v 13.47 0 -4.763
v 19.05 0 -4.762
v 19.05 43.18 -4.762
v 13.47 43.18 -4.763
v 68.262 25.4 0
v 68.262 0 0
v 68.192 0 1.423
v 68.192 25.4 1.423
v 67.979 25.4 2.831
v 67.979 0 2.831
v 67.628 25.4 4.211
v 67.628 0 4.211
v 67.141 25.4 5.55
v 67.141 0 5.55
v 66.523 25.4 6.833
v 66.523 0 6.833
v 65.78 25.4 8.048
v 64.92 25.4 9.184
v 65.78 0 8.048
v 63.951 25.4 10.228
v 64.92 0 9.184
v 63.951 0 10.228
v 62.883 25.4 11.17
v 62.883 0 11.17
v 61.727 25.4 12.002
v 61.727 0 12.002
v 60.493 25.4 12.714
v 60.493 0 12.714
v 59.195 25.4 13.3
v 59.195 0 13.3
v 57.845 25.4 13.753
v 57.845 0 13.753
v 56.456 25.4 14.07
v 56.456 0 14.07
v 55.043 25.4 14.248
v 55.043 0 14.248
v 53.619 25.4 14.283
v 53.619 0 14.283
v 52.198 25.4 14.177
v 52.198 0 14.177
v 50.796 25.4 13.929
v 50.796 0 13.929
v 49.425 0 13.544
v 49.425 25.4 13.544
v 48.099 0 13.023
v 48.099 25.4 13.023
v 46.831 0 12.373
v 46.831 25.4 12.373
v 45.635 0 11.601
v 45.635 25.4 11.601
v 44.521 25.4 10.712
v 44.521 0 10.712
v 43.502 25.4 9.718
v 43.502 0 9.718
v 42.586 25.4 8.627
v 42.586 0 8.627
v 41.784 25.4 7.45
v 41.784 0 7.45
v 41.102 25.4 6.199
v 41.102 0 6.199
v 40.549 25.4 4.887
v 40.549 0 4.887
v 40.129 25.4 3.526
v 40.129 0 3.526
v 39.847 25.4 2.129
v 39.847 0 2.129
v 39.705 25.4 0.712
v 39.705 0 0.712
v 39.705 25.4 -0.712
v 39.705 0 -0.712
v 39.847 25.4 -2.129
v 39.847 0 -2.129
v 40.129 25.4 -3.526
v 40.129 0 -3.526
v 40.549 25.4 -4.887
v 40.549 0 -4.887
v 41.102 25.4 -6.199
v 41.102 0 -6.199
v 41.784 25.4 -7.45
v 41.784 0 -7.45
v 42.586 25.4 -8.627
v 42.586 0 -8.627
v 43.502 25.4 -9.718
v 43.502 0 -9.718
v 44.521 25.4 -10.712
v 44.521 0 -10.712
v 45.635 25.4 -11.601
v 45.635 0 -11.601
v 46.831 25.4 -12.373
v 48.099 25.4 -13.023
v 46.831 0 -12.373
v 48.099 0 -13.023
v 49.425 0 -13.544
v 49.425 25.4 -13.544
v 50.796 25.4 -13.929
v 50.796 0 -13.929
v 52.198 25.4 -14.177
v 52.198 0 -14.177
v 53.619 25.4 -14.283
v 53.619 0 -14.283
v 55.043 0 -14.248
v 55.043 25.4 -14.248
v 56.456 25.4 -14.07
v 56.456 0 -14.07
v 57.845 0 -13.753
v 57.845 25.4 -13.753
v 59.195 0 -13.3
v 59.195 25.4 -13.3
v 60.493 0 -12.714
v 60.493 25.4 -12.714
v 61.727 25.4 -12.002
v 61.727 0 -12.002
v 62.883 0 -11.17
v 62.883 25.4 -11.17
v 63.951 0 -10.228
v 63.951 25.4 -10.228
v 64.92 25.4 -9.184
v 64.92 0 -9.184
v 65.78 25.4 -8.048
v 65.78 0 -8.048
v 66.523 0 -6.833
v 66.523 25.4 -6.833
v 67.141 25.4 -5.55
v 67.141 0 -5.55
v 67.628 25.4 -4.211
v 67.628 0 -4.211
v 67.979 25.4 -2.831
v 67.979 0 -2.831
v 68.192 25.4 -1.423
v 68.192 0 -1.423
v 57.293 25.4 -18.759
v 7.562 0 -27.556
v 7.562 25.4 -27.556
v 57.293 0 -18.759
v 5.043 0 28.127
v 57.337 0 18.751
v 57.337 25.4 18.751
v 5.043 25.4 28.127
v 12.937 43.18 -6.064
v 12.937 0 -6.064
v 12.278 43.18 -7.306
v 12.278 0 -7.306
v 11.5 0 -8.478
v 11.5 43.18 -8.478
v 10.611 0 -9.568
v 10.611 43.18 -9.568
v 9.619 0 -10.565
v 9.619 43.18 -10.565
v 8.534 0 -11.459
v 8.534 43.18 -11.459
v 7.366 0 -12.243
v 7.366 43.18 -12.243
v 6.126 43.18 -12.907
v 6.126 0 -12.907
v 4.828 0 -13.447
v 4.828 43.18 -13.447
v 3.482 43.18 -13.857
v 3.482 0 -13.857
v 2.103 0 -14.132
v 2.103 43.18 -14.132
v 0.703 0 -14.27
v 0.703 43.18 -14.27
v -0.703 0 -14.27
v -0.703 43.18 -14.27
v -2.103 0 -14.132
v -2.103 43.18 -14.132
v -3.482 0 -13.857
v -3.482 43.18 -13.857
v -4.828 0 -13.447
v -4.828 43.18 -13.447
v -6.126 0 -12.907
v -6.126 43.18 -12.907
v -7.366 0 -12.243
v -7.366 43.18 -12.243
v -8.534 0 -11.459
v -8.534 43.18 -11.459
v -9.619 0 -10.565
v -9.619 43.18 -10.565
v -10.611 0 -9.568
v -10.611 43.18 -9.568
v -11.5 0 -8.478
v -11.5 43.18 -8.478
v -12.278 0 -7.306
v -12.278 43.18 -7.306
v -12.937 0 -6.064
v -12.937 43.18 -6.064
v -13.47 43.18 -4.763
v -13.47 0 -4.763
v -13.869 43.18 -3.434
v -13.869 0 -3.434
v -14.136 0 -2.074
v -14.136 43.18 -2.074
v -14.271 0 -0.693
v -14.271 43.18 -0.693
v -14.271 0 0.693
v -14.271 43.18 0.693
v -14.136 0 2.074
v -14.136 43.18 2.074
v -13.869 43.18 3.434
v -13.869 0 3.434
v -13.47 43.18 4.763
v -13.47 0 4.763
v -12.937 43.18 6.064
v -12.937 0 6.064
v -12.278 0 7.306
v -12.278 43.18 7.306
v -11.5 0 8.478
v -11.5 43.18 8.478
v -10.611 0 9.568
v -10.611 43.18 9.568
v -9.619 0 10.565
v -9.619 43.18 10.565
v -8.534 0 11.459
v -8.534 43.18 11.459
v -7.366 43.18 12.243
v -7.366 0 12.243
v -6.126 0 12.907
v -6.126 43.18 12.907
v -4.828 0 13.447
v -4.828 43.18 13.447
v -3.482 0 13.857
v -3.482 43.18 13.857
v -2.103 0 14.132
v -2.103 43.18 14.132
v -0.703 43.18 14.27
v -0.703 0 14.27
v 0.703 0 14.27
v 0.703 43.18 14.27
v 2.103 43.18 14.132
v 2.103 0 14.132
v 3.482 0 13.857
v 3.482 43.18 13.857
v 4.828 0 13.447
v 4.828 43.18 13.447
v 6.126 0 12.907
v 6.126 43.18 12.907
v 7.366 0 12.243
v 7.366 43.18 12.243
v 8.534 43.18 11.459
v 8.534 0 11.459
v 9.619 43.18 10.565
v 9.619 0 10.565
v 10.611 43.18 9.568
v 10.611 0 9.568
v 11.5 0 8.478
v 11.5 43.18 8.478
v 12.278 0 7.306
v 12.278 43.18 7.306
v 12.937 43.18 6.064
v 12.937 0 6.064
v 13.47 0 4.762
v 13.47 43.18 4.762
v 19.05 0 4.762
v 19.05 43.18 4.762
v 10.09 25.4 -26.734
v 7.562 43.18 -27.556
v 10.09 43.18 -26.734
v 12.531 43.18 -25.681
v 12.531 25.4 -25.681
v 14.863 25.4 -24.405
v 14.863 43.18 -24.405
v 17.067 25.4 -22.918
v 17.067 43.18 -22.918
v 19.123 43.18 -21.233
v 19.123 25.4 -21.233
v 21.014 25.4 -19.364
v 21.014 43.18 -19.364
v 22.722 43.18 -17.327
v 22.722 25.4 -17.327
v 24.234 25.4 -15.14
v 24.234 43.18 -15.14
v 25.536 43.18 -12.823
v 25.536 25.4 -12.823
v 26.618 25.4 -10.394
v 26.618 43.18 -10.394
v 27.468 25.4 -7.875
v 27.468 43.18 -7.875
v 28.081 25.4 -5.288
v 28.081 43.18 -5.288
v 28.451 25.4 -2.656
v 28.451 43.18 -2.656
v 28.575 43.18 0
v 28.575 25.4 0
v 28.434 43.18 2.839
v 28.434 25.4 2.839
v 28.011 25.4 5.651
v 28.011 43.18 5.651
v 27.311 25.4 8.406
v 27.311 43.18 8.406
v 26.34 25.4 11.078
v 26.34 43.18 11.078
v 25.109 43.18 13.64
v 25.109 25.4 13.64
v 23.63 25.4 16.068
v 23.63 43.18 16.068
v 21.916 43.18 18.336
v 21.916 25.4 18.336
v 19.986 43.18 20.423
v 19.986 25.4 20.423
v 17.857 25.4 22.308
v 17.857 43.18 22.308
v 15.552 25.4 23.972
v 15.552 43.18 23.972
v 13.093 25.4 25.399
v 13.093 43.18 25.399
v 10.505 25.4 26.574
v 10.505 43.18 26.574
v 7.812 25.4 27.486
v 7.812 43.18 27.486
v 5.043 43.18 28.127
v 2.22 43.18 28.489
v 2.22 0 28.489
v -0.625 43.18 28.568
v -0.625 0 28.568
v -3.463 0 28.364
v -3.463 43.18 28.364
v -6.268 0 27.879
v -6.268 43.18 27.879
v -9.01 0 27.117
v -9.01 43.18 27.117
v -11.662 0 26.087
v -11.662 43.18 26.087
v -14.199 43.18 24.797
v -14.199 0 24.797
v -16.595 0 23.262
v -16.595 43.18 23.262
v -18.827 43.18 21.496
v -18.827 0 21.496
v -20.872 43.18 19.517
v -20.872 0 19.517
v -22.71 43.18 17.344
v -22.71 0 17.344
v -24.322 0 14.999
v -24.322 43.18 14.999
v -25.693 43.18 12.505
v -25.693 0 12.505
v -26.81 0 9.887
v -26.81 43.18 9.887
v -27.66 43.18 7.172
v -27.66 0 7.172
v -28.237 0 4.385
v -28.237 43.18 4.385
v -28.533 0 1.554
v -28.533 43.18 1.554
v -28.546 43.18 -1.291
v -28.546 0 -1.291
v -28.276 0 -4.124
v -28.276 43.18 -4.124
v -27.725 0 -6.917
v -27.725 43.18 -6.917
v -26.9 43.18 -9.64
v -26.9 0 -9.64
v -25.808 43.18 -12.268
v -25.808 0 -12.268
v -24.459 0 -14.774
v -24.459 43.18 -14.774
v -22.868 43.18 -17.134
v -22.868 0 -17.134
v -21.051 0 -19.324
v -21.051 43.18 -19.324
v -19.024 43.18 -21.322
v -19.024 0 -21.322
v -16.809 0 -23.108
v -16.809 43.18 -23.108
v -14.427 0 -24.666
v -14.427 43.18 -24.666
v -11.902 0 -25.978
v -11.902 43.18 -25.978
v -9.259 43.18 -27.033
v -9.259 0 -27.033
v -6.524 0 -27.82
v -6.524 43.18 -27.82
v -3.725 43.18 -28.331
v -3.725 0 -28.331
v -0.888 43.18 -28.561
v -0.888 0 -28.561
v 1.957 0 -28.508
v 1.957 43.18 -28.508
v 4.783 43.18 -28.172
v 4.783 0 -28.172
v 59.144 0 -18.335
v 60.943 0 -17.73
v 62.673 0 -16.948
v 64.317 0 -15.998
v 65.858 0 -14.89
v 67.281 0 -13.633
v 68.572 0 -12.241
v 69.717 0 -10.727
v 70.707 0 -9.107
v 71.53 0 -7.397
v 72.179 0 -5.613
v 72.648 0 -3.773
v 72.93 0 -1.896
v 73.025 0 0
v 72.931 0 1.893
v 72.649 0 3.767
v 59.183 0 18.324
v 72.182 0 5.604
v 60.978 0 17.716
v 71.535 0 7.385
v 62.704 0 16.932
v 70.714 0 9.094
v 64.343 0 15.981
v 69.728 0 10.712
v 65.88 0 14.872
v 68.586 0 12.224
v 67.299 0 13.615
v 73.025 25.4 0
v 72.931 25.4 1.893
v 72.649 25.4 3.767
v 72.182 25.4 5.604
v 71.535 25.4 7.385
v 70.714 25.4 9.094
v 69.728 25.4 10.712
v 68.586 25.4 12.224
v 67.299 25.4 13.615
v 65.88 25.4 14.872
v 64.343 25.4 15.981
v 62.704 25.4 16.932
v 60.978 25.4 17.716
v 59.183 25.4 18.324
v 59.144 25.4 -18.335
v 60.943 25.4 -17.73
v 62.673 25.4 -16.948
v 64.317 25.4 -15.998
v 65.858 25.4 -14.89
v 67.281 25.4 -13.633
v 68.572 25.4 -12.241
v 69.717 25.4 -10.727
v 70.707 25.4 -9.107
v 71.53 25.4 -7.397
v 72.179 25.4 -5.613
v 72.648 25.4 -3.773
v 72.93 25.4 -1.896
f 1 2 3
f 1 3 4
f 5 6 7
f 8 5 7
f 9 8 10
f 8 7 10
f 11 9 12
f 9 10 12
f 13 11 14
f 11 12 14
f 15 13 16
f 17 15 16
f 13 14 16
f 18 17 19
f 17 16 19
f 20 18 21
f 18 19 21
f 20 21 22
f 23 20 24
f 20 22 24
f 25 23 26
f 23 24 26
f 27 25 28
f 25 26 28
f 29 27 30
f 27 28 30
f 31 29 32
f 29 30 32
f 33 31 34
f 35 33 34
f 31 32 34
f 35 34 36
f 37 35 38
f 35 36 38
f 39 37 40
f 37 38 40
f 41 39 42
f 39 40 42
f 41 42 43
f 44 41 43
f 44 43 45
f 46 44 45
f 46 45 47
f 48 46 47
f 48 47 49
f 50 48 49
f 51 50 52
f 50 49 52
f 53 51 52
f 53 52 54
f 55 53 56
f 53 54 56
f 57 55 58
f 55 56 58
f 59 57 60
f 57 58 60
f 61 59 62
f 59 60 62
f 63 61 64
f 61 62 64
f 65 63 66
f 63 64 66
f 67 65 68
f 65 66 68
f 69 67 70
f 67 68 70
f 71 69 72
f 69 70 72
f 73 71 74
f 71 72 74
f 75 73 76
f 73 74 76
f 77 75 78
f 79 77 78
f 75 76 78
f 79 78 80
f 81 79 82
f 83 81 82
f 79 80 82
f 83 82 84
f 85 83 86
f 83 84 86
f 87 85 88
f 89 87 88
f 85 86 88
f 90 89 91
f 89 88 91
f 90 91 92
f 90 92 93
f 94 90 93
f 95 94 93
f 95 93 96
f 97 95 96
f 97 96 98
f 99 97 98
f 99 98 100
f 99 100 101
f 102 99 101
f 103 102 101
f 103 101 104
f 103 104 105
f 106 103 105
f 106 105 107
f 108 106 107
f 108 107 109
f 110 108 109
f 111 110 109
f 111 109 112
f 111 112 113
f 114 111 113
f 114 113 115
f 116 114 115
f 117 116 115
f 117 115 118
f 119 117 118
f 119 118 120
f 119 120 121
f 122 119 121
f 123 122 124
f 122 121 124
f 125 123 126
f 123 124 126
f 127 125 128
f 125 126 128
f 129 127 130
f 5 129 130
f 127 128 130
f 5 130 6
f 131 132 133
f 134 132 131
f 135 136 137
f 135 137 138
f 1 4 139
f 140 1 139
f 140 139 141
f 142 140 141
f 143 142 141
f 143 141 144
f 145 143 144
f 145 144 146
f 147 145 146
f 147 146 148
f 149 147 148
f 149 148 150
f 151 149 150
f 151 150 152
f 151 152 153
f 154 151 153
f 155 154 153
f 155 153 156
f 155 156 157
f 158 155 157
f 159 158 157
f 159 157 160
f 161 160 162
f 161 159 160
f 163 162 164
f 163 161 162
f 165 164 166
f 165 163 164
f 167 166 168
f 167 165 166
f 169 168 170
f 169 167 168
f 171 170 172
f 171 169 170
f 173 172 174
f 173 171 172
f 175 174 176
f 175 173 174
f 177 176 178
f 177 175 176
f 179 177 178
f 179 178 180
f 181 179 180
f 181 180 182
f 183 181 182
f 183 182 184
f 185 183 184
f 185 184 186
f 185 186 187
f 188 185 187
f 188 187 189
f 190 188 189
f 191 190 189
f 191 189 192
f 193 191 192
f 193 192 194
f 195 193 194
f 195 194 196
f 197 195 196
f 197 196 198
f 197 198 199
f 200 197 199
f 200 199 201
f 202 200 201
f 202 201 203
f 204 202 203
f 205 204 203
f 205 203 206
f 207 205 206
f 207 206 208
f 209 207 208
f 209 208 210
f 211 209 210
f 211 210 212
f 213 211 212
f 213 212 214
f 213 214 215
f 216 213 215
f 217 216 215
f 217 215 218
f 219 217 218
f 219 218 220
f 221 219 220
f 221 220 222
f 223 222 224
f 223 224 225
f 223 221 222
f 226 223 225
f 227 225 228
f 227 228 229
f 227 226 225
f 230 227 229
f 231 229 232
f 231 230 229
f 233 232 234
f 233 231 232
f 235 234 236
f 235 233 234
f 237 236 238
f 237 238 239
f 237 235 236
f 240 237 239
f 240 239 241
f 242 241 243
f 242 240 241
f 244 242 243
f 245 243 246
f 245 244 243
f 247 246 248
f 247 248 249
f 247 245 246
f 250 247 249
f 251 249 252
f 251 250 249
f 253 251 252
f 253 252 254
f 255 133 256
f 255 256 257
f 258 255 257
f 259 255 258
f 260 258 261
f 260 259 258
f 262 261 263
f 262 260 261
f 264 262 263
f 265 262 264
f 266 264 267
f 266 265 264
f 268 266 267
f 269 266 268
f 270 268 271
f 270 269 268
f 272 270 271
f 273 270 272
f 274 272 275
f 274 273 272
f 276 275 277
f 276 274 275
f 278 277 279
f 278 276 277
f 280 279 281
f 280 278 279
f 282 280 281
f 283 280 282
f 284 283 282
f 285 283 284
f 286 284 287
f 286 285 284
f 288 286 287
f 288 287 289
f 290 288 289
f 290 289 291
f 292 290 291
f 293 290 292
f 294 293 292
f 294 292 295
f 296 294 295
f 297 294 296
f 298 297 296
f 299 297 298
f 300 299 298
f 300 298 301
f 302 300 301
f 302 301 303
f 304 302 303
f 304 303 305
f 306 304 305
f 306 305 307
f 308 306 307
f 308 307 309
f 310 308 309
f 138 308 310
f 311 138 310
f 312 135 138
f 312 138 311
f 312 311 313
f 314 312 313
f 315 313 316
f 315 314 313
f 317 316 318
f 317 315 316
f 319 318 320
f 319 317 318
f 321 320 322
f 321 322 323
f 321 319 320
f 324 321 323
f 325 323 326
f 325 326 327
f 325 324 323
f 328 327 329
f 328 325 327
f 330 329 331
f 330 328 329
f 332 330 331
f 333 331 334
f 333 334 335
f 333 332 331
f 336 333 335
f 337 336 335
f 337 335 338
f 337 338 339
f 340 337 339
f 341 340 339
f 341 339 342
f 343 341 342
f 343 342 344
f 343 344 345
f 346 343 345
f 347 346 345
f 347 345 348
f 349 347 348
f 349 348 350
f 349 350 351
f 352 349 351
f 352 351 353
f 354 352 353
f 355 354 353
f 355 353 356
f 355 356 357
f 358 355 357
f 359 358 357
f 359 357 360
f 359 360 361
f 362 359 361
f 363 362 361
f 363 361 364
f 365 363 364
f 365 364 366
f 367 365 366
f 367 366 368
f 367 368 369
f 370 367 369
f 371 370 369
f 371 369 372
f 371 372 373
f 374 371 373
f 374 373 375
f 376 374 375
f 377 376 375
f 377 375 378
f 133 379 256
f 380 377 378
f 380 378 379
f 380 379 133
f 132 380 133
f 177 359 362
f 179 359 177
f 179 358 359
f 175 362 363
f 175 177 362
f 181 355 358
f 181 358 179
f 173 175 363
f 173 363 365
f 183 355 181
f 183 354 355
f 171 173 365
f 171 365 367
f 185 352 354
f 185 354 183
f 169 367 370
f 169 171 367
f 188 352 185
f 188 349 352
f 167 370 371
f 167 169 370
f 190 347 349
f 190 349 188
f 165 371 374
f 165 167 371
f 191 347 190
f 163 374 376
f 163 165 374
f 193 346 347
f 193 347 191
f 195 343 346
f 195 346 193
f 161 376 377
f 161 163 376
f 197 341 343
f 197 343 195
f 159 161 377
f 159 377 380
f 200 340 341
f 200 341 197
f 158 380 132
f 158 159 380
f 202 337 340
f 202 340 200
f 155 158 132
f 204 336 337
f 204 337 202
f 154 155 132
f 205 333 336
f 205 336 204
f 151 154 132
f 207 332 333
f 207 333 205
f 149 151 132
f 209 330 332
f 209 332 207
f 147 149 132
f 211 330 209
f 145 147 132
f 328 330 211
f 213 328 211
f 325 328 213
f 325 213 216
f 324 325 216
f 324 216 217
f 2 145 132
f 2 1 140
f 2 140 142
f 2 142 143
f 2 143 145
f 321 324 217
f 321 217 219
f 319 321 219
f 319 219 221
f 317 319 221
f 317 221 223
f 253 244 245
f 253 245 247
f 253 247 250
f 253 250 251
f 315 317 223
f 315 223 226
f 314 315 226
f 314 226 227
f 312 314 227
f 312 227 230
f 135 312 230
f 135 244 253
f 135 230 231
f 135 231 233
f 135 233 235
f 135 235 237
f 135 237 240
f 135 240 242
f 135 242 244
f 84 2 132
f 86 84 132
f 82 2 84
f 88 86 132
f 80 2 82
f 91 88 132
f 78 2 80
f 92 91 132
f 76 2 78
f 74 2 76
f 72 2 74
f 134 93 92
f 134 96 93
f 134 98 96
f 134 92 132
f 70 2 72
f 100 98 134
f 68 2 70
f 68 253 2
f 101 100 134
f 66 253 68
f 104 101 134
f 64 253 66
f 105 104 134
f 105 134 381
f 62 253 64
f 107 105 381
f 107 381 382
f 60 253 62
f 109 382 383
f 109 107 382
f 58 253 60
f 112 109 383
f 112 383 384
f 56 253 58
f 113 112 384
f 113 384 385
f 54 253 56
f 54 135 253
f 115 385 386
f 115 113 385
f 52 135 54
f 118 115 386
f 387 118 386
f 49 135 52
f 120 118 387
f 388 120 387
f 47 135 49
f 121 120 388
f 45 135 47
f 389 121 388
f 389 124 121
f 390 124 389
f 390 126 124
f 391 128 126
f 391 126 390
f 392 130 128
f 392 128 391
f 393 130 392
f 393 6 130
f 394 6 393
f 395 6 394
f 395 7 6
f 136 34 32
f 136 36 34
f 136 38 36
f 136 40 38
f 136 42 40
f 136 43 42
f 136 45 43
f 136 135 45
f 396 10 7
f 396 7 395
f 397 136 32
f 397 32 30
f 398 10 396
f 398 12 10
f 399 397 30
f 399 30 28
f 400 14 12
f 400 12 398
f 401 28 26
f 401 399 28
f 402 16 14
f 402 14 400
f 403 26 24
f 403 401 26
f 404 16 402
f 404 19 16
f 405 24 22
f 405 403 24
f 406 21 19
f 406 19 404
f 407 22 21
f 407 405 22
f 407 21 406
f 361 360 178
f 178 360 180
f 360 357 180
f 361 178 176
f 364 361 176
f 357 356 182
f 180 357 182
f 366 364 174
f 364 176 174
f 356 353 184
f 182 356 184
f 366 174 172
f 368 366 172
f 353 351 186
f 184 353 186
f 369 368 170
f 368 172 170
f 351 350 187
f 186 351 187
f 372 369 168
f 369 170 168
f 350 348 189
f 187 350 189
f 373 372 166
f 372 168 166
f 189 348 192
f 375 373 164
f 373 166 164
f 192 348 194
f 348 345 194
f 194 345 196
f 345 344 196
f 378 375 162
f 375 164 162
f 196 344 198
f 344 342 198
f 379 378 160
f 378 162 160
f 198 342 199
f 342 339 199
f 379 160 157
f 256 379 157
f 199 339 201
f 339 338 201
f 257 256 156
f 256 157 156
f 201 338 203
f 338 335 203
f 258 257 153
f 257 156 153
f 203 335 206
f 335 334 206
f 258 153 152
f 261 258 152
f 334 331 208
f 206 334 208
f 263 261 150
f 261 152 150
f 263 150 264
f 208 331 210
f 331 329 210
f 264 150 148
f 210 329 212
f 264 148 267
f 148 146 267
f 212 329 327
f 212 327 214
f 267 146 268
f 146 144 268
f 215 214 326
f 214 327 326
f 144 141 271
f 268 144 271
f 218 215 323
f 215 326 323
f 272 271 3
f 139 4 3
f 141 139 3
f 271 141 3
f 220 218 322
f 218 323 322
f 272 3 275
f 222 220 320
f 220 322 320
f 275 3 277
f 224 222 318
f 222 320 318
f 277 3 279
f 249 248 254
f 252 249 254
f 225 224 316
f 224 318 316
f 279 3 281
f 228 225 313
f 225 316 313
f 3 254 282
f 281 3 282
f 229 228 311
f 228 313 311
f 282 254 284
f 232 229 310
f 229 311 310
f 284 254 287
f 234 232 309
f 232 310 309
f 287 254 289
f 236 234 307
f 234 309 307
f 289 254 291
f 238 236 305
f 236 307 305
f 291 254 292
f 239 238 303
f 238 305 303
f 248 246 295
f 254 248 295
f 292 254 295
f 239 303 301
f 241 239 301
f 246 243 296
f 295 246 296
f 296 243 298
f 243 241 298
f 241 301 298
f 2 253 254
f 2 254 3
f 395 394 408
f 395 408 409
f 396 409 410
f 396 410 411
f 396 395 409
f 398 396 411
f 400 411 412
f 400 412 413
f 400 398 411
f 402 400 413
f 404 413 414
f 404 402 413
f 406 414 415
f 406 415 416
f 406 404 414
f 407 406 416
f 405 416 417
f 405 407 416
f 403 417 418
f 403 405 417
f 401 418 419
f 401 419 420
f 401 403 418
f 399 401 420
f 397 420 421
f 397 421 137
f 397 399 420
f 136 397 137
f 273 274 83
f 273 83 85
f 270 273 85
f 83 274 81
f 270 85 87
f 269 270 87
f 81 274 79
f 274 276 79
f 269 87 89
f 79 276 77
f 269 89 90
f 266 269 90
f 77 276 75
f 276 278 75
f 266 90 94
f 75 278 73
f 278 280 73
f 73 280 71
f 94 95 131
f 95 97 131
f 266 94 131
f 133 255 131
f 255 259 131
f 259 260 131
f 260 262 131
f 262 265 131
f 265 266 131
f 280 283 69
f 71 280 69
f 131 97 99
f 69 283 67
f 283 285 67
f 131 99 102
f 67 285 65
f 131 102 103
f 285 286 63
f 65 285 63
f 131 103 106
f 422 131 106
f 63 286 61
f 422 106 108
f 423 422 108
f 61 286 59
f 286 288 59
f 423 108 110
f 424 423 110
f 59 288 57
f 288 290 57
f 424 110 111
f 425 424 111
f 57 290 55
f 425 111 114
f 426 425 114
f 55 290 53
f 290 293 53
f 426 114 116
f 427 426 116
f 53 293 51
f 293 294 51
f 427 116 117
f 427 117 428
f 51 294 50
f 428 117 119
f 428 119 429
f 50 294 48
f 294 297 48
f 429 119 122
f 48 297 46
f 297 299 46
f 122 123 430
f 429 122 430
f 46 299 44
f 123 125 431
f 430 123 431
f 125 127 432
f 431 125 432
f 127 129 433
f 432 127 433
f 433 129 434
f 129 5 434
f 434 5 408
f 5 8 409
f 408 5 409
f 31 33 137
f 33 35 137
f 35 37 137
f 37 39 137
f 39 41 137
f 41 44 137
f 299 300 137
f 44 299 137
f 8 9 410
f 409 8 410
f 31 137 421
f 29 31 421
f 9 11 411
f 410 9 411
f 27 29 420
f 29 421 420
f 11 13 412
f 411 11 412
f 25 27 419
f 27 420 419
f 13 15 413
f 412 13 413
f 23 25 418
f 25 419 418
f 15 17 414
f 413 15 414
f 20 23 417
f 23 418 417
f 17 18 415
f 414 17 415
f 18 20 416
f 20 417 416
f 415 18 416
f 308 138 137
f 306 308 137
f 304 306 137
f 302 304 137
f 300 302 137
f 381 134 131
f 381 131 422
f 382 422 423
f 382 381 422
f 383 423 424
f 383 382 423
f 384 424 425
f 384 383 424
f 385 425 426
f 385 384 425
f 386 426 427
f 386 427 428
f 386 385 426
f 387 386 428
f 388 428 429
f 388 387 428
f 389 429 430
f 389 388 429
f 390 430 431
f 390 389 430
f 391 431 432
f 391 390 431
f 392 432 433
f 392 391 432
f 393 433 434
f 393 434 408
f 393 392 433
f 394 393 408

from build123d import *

# Parameters (mm, degrees)
F0_R     = 14.2875
F1_DEPTH = 25.4
F2_DEPTH = 43.18


with BuildPart() as f1:
    # F0 (on Front) → F1 (new body)
    with BuildSketch(Plane.XZ):
        with BuildLine():
            ThreePointArc((7.5618183068, -27.5562974453), (22.7223412429, -17.3270260992), (28.575, 0))
            ThreePointArc((28.575, 0), (21.9160245563, 18.3362616868), (5.0426470588, 28.1265414802))
            ThreePointArc((5.0426470588, 28.1265414802), (-28.5458013461, -1.2914528675), (7.5618183068, -27.5562974453))
        make_face()
        with BuildLine():
            ThreePointArc((-13.4703841816, 4.7625), (0, 14.2875), (13.4703841816, 4.7625))
            Line((13.4703841816, 4.7625), (19.05, 4.7625))
            Line((19.05, 4.7625), (19.05, -4.7625))
            Line((19.05, -4.7625), (13.4703841816, -4.7625))
            ThreePointArc((13.4703841816, -4.7625), (0, -14.2875), (-13.4703841816, -4.7625))
            Line((-13.4703841816, -4.7625), (-19.05, -4.7625))
            Line((-19.05, -4.7625), (-19.05, 4.7625))
            Line((-19.05, 4.7625), (-13.4703841816, 4.7625))
        make_face(mode=Mode.SUBTRACT)
        with BuildLine():
            ThreePointArc((5.0426470588, 28.1265414802), (21.9160245563, 18.3362616868), (28.575, 0))
            ThreePointArc((28.575, 0), (22.7223412429, -17.3270260992), (7.5618183068, -27.5562974453))
            Line((7.5618183068, -27.5562974453), (57.2934332861, -18.7587446415))
            ThreePointArc((57.2934332861, -18.7587446415), (34.9250127111, 0.0220066118), (57.3367647059, 18.7510276535))
            Line((57.3367647059, 18.7510276535), (5.0426470588, 28.1265414802))
        make_face()
        with BuildLine():
            ThreePointArc((73.025, 0), (68.5856830375, 12.2241744579), (57.3367647059, 18.7510276535))
            ThreePointArc((57.3367647059, 18.7510276535), (34.9250127111, 0.0220066118), (57.2934332861, -18.7587446415))
            ThreePointArc((57.2934332861, -18.7587446415), (68.571551889, -12.2410446021), (73.025, 0))
        make_face()
        with Locations((53.975, 0)):
            Circle(F0_R, mode=Mode.SUBTRACT)
        with BuildLine():
            ThreePointArc((-13.4703841816, -4.7625), (-14.2875, 0), (-13.4703841816, 4.7625))
            Line((-13.4703841816, 4.7625), (-19.05, 4.7625))
            Line((-19.05, 4.7625), (-19.05, -4.7625))
            Line((-19.05, -4.7625), (-13.4703841816, -4.7625))
        make_face()
    extrude(amount=-F1_DEPTH)

    # F0 (on Front) → F2 (join)
    with BuildSketch(Plane.XZ):
        with BuildLine():
            ThreePointArc((7.5618183068, -27.5562974453), (22.7223412429, -17.3270260992), (28.575, 0))
            ThreePointArc((28.575, 0), (21.9160245563, 18.3362616868), (5.0426470588, 28.1265414802))
            ThreePointArc((5.0426470588, 28.1265414802), (-28.5458013461, -1.2914528675), (7.5618183068, -27.5562974453))
        make_face()
        with BuildLine():
            ThreePointArc((-13.4703841816, 4.7625), (0, 14.2875), (13.4703841816, 4.7625))
            Line((13.4703841816, 4.7625), (19.05, 4.7625))
            Line((19.05, 4.7625), (19.05, -4.7625))
            Line((19.05, -4.7625), (13.4703841816, -4.7625))
            ThreePointArc((13.4703841816, -4.7625), (0, -14.2875), (-13.4703841816, -4.7625))
            Line((-13.4703841816, -4.7625), (-19.05, -4.7625))
            Line((-19.05, -4.7625), (-19.05, 4.7625))
            Line((-19.05, 4.7625), (-13.4703841816, 4.7625))
        make_face(mode=Mode.SUBTRACT)
        with BuildLine():
            ThreePointArc((-13.4703841816, -4.7625), (-14.2875, 0), (-13.4703841816, 4.7625))
            Line((-13.4703841816, 4.7625), (-19.05, 4.7625))
            Line((-19.05, 4.7625), (-19.05, -4.7625))
            Line((-19.05, -4.7625), (-13.4703841816, -4.7625))
        make_face()
    extrude(amount=-F2_DEPTH)


solid = f1.part
